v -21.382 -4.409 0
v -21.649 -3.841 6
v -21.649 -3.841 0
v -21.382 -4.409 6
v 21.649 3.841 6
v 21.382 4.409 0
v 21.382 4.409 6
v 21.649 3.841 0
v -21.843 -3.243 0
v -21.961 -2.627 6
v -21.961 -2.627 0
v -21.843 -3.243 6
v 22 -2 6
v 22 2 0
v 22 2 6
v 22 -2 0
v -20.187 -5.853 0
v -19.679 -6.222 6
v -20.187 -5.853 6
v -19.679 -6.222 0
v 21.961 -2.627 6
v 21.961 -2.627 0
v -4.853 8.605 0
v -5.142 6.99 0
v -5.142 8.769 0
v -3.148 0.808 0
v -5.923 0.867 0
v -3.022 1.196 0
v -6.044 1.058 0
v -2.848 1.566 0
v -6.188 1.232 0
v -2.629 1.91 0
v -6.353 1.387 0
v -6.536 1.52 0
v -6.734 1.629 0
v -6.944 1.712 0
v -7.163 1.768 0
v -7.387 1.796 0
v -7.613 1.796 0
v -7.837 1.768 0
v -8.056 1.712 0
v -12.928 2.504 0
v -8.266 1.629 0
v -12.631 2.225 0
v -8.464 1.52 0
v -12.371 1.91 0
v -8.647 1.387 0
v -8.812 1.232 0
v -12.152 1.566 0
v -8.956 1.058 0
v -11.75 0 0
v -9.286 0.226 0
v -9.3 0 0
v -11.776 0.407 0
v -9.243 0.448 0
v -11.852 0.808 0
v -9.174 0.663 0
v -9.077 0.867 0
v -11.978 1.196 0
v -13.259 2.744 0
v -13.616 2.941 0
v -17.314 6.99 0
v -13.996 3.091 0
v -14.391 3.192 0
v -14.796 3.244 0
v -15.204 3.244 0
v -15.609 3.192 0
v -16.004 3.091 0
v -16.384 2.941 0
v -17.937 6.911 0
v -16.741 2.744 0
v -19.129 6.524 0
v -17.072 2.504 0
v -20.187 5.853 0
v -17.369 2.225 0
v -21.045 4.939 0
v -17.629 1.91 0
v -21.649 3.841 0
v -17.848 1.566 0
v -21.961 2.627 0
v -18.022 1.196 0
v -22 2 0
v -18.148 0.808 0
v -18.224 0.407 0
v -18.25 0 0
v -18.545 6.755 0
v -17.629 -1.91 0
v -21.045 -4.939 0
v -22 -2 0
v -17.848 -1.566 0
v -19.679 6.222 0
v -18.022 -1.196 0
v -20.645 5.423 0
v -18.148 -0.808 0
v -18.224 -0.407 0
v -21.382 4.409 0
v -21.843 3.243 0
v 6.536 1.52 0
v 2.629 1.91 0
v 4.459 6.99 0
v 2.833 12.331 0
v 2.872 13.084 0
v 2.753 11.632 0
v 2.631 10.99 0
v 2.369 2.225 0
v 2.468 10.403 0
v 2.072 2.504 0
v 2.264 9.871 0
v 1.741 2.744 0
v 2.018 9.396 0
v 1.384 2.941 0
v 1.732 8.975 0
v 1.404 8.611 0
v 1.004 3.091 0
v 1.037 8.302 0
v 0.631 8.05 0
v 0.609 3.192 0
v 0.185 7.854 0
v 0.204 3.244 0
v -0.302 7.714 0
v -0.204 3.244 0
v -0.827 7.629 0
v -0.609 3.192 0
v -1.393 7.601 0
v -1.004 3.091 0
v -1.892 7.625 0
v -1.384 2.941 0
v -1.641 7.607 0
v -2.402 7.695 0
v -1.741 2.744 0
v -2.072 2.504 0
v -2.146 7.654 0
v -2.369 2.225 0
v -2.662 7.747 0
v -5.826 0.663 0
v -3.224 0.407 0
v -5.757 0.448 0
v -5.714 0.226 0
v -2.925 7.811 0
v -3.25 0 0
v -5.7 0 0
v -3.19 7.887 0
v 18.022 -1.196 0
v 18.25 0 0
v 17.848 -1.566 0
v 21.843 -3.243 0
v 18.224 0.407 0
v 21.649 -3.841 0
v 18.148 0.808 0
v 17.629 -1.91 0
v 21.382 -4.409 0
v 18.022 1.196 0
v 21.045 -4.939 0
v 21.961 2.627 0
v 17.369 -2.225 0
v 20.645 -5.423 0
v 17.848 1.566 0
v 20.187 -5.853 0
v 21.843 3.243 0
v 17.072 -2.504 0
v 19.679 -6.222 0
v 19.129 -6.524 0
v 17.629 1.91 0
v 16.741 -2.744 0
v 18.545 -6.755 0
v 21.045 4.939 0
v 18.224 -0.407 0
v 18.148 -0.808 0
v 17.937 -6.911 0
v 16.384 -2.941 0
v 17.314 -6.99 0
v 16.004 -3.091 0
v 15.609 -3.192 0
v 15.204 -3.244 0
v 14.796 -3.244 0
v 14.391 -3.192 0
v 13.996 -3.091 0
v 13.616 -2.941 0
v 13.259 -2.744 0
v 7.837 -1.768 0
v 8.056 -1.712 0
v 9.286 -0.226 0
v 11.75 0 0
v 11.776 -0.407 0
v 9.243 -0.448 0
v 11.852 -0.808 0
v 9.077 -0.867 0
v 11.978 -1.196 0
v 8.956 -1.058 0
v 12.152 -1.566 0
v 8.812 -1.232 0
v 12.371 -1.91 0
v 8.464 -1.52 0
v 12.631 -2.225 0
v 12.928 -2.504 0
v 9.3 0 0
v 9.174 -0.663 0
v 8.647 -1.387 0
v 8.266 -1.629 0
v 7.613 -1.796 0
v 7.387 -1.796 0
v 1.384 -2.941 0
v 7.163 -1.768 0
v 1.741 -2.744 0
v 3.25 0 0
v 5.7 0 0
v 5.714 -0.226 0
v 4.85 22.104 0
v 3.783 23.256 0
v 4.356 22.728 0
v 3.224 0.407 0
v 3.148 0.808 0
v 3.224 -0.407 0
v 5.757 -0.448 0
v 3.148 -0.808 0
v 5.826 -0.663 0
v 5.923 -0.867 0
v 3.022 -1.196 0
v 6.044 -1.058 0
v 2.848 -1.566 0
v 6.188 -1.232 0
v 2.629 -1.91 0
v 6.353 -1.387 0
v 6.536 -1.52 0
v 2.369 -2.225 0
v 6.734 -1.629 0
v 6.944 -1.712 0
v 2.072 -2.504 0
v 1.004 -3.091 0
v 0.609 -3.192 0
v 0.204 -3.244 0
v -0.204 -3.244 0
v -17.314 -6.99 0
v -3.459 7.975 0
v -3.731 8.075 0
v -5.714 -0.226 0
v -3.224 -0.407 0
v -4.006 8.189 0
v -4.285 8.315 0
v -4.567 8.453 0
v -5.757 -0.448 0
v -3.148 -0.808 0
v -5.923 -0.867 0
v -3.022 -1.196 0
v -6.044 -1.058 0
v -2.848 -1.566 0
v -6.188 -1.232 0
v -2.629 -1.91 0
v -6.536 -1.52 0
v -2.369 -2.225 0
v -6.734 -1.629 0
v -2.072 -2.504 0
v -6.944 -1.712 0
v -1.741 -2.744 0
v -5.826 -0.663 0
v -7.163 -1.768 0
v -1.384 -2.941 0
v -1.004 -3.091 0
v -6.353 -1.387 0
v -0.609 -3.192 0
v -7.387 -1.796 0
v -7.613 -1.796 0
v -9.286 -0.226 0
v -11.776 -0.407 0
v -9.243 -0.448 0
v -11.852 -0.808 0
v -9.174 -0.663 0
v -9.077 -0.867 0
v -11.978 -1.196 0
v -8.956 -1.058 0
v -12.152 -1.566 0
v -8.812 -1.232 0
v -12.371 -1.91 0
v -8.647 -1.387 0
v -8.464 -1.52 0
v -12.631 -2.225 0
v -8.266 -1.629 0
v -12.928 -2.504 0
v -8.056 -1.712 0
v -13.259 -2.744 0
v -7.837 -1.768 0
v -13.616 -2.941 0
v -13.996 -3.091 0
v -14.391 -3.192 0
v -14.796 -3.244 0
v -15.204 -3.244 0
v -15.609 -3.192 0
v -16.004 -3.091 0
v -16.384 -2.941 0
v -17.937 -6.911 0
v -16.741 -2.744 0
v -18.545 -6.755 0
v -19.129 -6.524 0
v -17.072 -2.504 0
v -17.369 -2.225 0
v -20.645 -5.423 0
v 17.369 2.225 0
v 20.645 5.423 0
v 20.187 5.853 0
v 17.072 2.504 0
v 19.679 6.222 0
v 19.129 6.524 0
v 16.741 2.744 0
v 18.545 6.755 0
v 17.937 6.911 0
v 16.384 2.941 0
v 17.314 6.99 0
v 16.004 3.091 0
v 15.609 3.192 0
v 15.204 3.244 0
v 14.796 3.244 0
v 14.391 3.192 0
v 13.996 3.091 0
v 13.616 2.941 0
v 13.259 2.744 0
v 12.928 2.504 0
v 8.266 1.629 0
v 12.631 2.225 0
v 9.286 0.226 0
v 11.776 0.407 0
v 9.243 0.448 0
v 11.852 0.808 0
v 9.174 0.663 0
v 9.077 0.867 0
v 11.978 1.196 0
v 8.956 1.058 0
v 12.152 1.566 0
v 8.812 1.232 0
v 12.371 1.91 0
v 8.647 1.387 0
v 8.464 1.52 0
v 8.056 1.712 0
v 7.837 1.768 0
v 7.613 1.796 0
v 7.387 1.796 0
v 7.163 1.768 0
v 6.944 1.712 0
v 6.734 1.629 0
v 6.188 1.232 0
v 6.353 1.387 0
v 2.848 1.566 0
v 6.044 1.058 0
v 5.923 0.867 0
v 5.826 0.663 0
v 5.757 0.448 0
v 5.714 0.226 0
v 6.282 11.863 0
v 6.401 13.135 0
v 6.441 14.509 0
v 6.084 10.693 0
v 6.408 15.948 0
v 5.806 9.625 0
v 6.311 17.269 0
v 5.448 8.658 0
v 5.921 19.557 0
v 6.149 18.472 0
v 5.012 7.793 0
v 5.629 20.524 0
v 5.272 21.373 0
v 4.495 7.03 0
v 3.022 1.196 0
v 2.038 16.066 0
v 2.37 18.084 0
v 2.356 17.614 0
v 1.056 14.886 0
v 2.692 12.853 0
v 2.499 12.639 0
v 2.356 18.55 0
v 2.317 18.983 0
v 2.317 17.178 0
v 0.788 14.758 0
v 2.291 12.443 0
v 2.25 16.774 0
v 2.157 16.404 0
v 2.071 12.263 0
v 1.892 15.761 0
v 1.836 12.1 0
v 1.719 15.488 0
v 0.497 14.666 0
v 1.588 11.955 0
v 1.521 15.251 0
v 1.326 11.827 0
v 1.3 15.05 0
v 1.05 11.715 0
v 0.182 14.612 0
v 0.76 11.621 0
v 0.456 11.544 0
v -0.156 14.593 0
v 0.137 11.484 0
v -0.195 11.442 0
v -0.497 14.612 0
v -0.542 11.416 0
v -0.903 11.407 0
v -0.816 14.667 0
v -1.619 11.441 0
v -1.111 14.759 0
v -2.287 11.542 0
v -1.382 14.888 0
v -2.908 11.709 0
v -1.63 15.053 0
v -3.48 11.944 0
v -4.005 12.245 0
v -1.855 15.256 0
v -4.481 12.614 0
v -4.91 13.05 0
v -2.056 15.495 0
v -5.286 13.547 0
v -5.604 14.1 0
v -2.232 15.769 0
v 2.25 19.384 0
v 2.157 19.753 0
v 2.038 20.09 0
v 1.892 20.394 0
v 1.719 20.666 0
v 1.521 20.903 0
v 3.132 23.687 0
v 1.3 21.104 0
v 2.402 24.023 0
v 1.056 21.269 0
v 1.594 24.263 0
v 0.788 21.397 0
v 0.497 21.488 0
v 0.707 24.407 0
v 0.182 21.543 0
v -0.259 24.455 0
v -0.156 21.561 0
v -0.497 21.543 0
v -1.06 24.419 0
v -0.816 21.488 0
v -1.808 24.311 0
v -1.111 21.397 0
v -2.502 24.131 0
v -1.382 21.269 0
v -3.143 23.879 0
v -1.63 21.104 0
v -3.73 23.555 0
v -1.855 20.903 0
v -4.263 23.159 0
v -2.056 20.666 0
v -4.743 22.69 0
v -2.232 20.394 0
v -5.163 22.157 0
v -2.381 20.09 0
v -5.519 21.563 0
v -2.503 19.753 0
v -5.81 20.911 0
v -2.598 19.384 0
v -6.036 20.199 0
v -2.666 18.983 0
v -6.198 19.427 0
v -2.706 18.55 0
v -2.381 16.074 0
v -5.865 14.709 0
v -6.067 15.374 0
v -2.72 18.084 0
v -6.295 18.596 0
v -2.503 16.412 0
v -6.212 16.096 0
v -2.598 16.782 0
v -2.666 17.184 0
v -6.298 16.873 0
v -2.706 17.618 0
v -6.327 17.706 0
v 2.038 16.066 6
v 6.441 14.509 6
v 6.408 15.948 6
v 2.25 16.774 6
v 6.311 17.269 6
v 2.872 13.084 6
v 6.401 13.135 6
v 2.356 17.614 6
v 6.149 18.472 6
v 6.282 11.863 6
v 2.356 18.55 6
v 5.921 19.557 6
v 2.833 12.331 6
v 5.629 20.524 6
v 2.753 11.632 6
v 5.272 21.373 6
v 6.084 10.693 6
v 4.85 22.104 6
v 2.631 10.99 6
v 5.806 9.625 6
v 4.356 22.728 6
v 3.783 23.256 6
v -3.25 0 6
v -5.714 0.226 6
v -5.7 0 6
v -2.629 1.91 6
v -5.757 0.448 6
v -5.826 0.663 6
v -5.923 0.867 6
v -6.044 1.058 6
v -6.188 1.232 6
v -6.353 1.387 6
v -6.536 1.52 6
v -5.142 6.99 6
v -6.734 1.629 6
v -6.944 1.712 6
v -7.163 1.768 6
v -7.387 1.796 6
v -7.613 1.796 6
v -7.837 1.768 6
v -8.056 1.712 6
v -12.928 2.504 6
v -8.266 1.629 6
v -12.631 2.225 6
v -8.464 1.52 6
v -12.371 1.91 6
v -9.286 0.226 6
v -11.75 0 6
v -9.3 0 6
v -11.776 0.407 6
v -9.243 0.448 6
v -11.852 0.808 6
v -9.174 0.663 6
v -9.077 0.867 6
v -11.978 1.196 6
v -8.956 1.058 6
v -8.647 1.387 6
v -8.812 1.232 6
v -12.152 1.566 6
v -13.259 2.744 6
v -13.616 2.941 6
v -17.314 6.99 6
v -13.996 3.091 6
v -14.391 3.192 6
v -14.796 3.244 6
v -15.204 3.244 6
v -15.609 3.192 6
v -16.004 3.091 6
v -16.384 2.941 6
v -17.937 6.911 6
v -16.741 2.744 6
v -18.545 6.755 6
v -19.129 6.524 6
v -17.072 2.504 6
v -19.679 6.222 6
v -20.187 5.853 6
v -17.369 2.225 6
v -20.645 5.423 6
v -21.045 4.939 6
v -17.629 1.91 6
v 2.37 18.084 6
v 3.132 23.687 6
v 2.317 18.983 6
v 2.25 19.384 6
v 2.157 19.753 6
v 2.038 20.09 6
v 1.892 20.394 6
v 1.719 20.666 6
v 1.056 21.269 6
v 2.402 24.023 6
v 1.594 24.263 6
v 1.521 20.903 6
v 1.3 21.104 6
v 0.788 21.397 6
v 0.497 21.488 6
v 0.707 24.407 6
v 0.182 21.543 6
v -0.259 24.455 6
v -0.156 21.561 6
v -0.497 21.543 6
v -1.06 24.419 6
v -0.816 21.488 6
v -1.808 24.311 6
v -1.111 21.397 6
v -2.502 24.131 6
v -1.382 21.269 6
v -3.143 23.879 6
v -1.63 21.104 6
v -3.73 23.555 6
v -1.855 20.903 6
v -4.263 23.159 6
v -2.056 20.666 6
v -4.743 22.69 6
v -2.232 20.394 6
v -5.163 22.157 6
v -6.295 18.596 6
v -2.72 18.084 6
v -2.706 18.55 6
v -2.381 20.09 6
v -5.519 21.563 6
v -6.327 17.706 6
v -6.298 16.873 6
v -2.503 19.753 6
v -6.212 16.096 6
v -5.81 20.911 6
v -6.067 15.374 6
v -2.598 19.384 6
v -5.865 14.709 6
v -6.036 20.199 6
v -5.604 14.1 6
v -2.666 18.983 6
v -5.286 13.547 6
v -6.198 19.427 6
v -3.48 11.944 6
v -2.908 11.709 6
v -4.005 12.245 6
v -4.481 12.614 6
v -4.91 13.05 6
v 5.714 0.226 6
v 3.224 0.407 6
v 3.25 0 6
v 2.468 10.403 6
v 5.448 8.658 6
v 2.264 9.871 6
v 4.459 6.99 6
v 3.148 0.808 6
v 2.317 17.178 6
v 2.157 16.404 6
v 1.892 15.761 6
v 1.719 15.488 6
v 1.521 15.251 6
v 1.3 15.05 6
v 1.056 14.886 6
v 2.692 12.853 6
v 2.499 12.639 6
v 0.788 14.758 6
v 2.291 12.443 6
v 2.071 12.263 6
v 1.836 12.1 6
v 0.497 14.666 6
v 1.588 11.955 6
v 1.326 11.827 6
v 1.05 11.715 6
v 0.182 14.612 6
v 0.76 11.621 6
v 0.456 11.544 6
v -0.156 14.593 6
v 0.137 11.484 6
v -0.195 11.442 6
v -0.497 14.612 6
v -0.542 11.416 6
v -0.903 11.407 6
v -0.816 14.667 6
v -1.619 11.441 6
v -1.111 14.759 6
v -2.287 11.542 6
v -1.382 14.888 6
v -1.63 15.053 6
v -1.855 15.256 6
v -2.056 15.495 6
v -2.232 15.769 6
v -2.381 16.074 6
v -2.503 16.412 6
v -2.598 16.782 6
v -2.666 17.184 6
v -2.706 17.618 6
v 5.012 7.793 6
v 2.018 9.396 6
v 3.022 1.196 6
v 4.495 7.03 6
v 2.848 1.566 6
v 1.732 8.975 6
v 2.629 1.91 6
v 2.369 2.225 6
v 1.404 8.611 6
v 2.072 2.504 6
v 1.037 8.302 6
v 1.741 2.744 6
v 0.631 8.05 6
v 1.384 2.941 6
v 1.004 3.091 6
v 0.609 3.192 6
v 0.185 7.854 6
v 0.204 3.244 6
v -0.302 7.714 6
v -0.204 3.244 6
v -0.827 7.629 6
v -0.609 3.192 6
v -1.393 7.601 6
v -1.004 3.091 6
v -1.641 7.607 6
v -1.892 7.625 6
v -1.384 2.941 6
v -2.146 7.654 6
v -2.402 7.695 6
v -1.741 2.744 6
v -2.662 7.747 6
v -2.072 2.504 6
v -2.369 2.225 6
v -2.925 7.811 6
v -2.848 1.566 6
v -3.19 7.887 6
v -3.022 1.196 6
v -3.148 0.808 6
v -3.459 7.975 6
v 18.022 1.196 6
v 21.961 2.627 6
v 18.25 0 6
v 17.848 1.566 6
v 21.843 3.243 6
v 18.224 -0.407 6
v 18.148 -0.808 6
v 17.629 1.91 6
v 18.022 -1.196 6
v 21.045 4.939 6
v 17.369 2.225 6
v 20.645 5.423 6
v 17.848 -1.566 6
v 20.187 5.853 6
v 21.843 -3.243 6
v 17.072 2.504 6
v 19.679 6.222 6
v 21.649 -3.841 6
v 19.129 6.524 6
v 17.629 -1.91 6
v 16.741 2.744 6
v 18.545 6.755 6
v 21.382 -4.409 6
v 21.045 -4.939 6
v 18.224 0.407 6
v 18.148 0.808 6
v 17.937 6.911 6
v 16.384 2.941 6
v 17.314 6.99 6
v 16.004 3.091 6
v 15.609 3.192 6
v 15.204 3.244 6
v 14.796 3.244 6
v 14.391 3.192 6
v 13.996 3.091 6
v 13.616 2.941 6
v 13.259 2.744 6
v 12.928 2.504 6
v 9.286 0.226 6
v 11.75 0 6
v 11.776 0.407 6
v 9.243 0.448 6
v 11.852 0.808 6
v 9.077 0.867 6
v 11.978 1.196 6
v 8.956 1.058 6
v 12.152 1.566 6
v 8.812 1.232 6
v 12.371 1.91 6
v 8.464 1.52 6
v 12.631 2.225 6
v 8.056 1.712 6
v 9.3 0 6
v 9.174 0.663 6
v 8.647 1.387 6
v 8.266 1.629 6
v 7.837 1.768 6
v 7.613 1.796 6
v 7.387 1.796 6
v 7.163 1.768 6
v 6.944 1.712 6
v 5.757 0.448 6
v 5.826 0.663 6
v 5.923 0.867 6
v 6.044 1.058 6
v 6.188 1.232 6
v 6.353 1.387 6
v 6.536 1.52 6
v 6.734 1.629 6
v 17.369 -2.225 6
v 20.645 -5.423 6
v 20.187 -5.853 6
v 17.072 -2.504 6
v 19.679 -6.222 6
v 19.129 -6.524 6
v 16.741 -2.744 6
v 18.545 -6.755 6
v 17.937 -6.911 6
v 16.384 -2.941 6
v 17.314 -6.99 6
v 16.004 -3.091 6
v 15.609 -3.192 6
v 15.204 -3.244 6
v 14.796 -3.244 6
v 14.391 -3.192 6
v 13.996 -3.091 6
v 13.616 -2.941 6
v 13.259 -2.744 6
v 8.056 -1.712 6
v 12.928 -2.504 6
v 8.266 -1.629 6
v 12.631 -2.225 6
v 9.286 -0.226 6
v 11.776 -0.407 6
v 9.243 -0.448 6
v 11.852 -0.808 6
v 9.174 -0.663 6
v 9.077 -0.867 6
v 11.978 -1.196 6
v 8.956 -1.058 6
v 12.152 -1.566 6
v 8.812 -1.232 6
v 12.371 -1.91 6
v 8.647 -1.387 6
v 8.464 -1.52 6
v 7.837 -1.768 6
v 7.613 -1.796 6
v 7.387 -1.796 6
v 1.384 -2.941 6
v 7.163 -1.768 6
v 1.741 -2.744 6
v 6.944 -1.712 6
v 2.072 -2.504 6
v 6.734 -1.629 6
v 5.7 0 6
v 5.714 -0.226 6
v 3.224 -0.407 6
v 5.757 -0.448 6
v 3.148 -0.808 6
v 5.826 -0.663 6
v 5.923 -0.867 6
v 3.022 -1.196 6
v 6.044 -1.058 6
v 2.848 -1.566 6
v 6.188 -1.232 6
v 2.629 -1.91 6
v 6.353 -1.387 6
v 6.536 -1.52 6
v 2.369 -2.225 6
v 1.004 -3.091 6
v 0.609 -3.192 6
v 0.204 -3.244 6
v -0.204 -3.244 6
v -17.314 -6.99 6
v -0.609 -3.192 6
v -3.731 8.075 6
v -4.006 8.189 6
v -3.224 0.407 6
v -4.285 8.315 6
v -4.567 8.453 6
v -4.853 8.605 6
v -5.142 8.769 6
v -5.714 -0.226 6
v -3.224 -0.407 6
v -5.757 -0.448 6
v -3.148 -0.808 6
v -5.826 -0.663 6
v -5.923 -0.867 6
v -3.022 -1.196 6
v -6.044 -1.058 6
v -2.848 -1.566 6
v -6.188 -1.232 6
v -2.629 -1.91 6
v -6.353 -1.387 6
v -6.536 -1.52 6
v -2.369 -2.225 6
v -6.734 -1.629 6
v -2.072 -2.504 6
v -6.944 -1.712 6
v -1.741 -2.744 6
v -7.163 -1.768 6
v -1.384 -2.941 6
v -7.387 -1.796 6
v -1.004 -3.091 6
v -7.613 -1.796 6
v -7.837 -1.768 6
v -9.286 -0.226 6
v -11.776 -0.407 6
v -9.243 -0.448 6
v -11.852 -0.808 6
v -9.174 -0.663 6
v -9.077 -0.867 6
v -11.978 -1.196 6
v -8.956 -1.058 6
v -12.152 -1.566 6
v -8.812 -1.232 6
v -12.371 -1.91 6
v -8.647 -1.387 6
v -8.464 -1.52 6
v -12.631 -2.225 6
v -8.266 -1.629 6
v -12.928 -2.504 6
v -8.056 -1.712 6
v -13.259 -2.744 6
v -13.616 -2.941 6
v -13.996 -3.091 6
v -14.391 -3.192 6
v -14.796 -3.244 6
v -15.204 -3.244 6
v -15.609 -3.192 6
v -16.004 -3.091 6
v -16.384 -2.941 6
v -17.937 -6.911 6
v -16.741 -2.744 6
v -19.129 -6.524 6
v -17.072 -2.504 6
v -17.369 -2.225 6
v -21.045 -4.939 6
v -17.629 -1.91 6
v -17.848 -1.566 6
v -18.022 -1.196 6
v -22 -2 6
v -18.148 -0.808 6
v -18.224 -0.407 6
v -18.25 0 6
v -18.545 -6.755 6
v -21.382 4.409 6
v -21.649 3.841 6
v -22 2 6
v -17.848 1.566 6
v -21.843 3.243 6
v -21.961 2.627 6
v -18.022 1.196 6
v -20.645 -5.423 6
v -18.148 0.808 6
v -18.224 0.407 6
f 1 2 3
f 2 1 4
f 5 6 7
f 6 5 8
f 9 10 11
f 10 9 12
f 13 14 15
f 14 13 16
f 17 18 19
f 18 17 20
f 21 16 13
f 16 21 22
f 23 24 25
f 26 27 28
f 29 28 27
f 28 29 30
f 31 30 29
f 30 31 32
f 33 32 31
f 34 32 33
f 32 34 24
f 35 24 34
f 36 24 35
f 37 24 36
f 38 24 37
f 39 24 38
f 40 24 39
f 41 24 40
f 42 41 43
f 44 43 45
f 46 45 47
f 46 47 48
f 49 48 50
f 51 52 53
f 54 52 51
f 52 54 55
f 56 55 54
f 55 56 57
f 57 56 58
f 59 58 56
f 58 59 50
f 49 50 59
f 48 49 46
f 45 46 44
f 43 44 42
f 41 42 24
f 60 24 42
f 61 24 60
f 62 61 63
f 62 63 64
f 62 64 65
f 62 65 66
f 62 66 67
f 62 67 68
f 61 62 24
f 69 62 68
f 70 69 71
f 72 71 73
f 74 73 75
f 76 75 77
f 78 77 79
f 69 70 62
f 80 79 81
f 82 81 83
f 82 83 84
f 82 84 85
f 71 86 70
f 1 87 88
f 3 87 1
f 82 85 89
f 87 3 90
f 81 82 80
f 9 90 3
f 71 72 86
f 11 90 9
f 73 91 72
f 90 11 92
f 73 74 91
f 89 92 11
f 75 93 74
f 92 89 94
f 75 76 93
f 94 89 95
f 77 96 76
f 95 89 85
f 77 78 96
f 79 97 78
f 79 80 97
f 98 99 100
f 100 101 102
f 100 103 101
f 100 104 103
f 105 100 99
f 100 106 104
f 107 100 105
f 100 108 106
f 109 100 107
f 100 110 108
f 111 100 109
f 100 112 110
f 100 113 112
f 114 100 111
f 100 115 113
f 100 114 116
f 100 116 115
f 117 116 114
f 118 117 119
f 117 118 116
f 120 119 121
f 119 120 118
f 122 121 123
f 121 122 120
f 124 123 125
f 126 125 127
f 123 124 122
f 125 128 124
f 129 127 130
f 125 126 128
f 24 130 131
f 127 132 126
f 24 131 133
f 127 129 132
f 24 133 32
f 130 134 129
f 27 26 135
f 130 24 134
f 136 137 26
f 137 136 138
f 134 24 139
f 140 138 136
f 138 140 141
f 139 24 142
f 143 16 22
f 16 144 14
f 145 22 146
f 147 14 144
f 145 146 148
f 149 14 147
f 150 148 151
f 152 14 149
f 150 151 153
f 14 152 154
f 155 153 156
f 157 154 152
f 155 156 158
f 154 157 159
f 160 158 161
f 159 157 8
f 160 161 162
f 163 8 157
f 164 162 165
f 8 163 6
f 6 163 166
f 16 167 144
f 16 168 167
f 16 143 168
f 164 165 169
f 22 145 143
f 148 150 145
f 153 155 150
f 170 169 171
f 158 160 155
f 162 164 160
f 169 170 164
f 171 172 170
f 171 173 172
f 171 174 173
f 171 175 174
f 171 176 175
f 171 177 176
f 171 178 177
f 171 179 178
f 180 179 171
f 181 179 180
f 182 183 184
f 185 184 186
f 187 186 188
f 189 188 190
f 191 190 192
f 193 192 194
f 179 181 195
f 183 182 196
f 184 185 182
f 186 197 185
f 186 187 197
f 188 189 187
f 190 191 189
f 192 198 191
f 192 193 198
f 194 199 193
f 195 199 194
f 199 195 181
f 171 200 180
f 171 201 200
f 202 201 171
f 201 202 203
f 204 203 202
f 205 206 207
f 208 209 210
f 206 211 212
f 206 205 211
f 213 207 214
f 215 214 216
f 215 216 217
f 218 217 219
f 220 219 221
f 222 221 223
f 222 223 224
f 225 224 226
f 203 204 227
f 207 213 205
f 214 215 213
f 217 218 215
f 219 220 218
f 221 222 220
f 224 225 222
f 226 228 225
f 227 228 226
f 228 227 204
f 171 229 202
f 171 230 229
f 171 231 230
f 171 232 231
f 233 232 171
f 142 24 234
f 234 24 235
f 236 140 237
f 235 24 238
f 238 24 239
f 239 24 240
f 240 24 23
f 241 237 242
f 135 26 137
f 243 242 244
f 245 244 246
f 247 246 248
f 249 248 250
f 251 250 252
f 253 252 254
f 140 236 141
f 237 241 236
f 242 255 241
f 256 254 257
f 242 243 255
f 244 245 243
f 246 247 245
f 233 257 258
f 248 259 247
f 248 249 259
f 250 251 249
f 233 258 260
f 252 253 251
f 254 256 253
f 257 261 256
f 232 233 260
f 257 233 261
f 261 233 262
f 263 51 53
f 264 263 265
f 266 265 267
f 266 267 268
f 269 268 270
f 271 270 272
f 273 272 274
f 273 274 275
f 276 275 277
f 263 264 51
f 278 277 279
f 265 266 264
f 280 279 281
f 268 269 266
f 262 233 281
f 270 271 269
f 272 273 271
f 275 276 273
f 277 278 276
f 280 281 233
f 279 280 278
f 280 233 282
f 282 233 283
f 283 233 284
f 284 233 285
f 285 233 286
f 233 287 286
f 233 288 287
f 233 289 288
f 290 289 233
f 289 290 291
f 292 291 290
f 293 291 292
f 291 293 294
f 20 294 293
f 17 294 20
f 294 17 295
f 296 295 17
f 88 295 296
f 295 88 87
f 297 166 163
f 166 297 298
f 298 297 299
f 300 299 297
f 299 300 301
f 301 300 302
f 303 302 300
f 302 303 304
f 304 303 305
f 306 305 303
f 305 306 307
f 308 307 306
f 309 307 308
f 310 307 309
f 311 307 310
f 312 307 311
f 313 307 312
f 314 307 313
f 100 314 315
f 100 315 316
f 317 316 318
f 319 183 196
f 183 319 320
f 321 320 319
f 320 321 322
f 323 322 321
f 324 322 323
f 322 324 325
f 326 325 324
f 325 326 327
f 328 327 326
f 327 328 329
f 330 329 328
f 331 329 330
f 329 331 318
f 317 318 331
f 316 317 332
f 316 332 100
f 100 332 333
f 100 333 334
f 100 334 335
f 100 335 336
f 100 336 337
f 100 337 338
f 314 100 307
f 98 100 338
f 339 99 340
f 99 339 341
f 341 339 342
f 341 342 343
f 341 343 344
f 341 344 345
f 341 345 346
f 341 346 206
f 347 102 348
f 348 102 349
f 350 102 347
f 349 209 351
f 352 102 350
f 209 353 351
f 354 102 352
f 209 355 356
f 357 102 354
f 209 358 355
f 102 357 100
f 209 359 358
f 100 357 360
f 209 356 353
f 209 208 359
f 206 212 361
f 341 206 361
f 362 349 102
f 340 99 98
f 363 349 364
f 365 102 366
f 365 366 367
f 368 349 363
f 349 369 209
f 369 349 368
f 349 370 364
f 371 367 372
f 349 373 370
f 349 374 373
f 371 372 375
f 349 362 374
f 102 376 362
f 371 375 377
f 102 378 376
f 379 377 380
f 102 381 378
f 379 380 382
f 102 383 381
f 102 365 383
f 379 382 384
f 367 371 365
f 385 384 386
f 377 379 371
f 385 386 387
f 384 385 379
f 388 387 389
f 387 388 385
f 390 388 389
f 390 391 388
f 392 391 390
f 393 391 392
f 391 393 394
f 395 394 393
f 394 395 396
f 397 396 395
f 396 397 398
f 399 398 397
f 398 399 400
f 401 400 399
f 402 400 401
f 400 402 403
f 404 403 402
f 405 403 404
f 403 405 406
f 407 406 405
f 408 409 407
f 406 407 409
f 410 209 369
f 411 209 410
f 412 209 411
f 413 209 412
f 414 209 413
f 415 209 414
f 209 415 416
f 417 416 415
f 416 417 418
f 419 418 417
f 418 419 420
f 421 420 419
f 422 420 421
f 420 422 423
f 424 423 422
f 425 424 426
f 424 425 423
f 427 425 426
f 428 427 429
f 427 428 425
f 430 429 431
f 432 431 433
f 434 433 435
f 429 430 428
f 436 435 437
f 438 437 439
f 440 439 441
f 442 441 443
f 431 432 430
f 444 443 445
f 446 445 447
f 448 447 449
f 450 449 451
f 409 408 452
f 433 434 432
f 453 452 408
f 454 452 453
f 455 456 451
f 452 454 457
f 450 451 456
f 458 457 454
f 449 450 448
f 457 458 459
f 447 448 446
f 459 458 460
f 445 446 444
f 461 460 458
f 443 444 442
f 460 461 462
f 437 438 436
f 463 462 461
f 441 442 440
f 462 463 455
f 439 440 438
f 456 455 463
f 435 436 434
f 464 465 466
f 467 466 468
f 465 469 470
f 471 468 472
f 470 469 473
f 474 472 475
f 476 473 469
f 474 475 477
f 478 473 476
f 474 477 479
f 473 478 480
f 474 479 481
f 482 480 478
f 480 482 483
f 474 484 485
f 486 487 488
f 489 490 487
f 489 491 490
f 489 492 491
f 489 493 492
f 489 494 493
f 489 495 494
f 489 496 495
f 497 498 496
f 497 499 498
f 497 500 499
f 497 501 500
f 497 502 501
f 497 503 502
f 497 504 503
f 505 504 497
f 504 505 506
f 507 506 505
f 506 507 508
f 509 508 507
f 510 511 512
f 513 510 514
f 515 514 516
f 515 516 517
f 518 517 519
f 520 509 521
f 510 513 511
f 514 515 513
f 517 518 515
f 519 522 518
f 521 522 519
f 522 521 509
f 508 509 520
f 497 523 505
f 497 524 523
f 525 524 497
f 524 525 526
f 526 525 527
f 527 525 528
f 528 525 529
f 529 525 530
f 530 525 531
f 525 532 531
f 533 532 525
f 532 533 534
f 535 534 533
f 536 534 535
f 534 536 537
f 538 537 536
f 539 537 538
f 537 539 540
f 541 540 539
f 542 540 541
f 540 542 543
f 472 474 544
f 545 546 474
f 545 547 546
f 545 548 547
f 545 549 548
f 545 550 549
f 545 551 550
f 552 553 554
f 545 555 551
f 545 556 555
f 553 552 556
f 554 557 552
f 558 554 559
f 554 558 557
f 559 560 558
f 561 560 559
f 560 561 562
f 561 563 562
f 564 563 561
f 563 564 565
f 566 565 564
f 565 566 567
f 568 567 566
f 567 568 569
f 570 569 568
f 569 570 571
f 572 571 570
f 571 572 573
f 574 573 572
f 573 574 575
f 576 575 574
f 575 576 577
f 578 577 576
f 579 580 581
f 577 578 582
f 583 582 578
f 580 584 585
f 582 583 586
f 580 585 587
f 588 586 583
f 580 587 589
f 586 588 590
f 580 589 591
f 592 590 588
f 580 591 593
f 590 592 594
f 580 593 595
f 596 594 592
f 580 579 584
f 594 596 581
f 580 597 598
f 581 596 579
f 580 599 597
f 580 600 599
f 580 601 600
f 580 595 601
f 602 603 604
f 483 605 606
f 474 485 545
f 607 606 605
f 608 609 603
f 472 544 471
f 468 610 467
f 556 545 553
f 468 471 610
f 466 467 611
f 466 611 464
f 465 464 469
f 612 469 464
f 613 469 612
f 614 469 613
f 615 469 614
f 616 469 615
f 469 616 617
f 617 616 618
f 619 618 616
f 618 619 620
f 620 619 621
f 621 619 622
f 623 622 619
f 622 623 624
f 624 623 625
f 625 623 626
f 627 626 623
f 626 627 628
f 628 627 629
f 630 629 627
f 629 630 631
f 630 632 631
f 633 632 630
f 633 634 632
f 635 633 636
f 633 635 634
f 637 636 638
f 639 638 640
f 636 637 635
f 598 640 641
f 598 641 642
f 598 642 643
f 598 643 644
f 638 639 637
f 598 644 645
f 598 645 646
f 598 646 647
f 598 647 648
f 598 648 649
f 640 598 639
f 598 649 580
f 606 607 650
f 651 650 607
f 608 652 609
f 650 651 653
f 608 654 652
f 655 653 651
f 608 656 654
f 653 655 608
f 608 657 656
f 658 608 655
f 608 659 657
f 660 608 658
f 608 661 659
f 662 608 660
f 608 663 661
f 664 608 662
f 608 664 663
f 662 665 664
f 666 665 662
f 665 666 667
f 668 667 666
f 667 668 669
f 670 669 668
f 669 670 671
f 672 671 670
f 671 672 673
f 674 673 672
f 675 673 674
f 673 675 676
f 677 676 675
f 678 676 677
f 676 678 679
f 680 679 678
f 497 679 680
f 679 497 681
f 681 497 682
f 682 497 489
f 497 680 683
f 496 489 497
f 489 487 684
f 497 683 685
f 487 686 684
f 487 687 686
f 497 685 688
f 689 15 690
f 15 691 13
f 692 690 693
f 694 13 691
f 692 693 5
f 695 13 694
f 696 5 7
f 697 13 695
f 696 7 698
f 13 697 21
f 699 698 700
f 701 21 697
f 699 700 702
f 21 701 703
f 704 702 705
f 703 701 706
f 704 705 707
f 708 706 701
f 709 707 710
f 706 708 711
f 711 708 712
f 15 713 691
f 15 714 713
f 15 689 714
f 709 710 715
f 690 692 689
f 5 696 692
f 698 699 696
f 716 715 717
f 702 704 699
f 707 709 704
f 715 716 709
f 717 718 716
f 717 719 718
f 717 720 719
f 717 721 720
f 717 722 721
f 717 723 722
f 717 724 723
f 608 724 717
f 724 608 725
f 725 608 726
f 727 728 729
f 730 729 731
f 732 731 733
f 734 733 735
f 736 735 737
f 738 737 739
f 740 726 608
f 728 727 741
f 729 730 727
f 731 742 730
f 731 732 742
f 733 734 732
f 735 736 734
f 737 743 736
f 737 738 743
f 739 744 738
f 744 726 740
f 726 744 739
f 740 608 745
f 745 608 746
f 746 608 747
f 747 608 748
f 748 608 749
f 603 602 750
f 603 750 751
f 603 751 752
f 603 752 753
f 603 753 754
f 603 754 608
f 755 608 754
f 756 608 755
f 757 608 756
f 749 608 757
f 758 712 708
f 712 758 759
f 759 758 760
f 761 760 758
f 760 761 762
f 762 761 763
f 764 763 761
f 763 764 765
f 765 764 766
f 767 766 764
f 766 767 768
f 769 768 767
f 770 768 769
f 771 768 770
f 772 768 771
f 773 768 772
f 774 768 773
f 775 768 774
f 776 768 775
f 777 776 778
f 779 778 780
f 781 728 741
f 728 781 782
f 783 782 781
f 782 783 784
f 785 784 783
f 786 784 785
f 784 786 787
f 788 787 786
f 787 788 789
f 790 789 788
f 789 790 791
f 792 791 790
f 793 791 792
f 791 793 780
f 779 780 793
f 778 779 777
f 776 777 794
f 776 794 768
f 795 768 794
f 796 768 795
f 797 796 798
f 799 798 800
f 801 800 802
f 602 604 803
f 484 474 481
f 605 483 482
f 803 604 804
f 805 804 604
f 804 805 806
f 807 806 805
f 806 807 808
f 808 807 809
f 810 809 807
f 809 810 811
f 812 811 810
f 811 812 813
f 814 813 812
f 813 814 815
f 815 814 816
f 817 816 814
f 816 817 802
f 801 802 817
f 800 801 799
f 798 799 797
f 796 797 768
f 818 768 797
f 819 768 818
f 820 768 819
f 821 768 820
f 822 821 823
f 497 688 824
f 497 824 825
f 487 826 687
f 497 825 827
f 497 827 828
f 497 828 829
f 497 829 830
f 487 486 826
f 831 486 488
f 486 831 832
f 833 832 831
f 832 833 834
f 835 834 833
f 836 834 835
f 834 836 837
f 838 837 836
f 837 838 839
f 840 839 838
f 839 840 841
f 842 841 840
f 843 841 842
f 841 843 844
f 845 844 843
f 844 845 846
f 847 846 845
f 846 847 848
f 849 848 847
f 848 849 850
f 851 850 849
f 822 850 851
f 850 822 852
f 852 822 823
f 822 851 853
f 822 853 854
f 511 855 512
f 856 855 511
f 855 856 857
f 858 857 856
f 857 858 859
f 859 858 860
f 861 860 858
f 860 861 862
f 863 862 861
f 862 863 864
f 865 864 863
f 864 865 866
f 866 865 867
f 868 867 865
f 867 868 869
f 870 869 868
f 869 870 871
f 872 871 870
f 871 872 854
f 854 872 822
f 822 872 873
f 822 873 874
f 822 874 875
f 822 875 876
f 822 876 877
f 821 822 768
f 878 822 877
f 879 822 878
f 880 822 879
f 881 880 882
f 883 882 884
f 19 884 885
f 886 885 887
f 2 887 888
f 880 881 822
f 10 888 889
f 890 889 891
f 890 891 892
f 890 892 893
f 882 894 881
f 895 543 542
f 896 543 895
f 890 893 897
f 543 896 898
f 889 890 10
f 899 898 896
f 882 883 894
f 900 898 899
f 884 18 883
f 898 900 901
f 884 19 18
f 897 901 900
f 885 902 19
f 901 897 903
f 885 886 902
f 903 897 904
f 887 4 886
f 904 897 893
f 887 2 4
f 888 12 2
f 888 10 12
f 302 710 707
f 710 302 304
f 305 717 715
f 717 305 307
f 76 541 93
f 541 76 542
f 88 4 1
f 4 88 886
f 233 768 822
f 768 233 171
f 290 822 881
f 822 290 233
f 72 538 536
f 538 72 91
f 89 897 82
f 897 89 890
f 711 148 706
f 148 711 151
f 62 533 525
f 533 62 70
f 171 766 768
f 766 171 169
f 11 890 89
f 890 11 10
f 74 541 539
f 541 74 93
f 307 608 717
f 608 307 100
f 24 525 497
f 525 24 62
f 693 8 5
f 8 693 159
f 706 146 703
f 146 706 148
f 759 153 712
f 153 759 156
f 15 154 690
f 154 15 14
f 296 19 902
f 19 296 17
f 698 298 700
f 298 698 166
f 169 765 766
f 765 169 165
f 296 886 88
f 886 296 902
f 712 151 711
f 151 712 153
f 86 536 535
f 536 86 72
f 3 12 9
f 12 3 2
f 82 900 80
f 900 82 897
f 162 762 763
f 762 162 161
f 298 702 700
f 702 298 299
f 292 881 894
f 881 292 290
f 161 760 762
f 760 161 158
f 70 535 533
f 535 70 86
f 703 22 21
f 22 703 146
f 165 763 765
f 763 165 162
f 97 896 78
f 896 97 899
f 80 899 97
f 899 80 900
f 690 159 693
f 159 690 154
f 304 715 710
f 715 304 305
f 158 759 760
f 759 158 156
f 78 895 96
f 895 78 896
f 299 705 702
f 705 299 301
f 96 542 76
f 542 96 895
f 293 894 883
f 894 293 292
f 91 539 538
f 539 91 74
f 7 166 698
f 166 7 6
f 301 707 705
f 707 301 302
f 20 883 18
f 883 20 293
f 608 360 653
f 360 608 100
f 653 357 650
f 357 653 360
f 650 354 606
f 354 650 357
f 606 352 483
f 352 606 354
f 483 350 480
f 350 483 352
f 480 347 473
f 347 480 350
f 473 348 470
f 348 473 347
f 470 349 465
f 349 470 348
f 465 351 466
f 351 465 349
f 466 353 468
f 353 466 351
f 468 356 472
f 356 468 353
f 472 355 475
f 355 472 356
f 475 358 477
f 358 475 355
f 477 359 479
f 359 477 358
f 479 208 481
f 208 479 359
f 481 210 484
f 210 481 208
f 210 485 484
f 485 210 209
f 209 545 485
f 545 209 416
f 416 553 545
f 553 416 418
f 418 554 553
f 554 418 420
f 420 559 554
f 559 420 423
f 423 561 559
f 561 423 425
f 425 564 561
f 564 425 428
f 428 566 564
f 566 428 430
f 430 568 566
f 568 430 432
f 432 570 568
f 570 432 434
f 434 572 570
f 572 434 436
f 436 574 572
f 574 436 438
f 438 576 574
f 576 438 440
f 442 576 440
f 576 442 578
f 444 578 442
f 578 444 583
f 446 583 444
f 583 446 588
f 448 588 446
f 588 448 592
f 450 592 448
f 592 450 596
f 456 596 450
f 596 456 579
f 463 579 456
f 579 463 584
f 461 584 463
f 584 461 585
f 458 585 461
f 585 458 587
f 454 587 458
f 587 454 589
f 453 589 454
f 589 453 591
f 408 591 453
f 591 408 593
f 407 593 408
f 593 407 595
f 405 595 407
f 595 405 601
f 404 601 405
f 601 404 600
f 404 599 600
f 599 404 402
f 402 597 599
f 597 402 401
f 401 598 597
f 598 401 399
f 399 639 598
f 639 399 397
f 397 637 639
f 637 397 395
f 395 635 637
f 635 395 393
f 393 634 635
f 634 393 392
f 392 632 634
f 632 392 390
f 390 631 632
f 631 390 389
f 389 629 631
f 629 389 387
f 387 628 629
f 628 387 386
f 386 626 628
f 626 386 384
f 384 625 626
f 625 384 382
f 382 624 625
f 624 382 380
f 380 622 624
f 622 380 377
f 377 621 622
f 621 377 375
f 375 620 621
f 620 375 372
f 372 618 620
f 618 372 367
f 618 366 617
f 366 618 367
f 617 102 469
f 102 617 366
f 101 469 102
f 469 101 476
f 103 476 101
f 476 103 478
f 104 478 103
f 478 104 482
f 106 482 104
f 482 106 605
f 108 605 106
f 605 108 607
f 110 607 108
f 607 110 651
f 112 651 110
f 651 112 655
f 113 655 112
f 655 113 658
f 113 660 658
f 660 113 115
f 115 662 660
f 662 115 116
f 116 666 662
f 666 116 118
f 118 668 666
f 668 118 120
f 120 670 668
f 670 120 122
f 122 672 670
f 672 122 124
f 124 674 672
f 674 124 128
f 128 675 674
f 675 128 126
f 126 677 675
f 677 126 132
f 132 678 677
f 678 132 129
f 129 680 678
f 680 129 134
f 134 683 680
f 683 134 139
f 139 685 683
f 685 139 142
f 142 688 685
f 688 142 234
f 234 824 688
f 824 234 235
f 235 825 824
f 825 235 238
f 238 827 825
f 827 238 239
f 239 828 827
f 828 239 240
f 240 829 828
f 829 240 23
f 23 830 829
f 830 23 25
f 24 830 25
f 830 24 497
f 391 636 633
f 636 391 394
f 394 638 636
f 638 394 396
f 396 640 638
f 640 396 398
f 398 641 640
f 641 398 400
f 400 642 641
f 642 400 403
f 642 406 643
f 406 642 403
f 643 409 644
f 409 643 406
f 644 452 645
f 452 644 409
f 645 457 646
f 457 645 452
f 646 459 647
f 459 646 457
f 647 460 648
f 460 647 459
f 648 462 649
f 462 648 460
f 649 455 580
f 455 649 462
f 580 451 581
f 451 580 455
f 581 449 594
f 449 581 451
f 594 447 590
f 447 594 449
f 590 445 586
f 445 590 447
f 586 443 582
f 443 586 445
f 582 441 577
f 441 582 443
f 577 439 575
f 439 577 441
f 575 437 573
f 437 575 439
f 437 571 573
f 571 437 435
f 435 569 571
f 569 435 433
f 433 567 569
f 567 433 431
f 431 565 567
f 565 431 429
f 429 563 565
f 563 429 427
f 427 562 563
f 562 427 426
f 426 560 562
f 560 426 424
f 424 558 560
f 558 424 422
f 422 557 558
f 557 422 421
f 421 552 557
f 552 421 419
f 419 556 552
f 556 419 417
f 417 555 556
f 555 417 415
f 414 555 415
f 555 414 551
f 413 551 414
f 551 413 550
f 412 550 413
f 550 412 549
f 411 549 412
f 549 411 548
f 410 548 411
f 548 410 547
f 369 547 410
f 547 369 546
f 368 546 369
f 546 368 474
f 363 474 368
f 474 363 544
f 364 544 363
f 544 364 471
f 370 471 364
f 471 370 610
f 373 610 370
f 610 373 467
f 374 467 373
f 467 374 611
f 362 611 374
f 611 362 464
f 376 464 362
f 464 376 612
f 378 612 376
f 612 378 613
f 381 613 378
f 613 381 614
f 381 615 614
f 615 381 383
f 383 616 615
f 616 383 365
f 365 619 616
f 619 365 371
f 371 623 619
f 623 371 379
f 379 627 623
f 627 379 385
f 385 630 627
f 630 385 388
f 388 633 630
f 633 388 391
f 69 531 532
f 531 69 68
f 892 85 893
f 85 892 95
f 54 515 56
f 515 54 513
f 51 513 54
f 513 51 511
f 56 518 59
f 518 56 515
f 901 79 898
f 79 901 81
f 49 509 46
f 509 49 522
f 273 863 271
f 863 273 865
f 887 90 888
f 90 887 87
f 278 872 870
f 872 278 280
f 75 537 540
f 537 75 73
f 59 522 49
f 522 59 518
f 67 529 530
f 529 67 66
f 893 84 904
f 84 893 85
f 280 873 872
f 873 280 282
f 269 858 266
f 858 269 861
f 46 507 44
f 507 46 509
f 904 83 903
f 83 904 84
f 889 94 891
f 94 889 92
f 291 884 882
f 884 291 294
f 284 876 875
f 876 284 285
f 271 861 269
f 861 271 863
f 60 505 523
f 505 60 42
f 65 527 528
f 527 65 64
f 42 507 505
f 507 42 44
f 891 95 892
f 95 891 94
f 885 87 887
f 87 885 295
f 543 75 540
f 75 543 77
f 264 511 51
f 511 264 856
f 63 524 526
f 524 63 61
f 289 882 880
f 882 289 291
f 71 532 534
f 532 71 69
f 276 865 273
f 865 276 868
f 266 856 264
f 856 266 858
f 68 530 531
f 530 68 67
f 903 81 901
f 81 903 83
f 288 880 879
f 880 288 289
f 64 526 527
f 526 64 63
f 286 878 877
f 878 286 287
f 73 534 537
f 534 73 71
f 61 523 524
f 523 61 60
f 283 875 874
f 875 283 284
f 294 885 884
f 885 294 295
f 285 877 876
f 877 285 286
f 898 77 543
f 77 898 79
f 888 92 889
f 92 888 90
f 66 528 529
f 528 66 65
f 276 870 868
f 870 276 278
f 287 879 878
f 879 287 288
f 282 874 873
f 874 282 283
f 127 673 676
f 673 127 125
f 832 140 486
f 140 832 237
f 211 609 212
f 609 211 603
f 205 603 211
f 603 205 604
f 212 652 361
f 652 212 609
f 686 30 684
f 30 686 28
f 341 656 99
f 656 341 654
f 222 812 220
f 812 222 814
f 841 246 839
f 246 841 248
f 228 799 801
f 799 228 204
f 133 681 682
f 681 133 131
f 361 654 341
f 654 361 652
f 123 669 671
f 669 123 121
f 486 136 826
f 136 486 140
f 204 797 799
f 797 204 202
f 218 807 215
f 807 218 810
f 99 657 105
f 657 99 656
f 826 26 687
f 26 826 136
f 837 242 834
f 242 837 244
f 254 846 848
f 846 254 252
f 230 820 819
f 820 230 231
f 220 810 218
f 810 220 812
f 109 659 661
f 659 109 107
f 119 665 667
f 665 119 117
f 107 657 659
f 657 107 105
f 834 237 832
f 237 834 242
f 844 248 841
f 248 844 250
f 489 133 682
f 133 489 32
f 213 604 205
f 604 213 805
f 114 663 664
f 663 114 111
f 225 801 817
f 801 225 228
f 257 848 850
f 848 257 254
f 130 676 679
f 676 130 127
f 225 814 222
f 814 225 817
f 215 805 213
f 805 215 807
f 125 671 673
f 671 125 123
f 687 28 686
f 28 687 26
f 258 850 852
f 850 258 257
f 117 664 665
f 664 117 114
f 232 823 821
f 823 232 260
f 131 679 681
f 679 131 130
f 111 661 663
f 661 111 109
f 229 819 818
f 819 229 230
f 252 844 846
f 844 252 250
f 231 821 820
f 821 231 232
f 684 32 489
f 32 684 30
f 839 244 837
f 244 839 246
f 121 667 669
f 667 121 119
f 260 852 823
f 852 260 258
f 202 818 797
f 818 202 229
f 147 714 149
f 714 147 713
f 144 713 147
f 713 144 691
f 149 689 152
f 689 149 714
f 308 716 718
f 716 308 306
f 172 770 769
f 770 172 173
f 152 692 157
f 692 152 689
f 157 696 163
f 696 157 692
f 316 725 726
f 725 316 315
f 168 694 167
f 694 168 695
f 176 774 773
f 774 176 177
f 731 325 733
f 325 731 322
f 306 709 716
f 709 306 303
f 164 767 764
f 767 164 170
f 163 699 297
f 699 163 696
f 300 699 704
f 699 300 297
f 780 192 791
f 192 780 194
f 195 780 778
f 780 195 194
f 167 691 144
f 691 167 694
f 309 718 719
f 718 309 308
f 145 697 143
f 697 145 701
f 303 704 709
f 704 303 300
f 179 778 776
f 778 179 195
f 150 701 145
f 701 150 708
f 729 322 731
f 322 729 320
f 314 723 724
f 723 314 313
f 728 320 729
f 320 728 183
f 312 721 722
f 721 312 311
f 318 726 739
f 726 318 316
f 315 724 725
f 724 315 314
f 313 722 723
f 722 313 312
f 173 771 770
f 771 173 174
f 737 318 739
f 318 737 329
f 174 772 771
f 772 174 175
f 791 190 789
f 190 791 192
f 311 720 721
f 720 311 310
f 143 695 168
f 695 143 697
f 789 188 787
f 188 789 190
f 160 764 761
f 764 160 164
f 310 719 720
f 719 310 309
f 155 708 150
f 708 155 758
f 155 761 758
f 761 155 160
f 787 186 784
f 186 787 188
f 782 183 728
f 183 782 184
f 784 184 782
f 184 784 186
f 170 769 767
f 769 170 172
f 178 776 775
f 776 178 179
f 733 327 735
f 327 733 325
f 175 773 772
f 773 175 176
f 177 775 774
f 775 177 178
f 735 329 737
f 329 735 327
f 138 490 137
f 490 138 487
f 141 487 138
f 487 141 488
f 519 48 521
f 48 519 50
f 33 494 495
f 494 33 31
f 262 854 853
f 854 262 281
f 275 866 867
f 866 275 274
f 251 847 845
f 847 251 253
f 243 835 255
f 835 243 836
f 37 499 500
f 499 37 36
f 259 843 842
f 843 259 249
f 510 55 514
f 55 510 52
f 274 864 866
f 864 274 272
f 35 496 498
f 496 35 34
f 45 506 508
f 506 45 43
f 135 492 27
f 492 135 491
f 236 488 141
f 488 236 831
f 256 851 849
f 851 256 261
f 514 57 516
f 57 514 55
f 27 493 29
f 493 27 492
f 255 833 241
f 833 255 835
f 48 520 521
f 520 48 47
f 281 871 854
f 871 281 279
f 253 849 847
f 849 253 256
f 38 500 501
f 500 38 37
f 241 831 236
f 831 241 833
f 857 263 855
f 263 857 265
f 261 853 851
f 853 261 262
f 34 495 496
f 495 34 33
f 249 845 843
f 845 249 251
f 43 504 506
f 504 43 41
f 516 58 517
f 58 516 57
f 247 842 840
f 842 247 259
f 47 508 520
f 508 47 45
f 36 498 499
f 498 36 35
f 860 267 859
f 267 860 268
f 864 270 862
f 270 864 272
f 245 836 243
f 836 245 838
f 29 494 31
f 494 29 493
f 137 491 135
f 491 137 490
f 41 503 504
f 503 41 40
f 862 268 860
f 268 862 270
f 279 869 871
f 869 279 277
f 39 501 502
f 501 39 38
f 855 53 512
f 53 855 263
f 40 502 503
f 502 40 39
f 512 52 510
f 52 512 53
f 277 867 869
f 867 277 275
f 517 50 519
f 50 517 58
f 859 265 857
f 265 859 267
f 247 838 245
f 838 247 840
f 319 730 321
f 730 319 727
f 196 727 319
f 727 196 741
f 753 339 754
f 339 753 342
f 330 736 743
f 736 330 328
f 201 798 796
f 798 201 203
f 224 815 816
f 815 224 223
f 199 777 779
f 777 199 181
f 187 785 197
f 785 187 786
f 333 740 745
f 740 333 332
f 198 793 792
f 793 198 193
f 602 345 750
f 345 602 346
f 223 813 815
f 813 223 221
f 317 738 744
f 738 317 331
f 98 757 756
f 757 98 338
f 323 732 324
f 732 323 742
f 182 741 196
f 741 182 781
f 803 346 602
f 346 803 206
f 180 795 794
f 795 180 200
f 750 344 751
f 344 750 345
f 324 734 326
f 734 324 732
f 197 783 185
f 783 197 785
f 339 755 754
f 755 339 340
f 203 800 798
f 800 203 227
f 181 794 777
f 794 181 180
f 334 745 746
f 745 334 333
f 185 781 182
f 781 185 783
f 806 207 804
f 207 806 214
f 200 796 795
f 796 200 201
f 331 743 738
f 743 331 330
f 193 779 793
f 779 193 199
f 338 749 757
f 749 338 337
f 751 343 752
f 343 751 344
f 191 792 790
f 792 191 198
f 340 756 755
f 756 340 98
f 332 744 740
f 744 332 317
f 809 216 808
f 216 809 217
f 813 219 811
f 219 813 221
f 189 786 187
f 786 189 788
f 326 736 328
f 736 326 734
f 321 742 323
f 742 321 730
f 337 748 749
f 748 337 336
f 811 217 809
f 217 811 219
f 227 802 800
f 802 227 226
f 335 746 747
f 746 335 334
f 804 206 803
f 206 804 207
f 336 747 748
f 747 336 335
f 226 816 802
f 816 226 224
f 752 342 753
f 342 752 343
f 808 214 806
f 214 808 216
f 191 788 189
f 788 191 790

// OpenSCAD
$fn = 50;


difference() {
	union() {
		hull() {
			translate(v = [-17.0000000000, 2.0000000000, 0]) {
				cylinder(h = 6, r = 5);
			}
			translate(v = [17.0000000000, 2.0000000000, 0]) {
				cylinder(h = 6, r = 5);
			}
			translate(v = [-17.0000000000, -2.0000000000, 0]) {
				cylinder(h = 6, r = 5);
			}
			translate(v = [17.0000000000, -2.0000000000, 0]) {
				cylinder(h = 6, r = 5);
			}
		}
		translate(v = [0, 24, 0]) {
			linear_extrude(height = 6) {
				text(font = "DejaVu Sans Mono:style=Bold", halign = "center", size = 19.0000000000, text = "9", valign = "top");
			}
		}
	}
	union() {
		translate(v = [-15.0000000000, 0.0000000000, 0]) {
			translate(v = [0, 0, -100]) {
				cylinder(h = 200, r = 3.2500000000);
			}
		}
		translate(v = [0, 0, -100]) {
			cylinder(h = 200, r = 3.2500000000);
		}
		translate(v = [15.0000000000, 0.0000000000, 0]) {
			translate(v = [0, 0, -100]) {
				cylinder(h = 200, r = 3.2500000000);
			}
		}
		translate(v = [-15.0000000000, 0.0000000000, 0]) {
			translate(v = [0, 0, -100]) {
				cylinder(h = 200, r = 1.8000000000);
			}
		}
		translate(v = [-7.5000000000, 0.0000000000, 0]) {
			translate(v = [0, 0, -100]) {
				cylinder(h = 200, r = 1.8000000000);
			}
		}
		translate(v = [0, 0, -100]) {
			cylinder(h = 200, r = 1.8000000000);
		}
		translate(v = [7.5000000000, 0.0000000000, 0]) {
			translate(v = [0, 0, -100]) {
				cylinder(h = 200, r = 1.8000000000);
			}
		}
		translate(v = [15.0000000000, 0.0000000000, 0]) {
			translate(v = [0, 0, -100]) {
				cylinder(h = 200, r = 1.8000000000);
			}
		}
	}
}
